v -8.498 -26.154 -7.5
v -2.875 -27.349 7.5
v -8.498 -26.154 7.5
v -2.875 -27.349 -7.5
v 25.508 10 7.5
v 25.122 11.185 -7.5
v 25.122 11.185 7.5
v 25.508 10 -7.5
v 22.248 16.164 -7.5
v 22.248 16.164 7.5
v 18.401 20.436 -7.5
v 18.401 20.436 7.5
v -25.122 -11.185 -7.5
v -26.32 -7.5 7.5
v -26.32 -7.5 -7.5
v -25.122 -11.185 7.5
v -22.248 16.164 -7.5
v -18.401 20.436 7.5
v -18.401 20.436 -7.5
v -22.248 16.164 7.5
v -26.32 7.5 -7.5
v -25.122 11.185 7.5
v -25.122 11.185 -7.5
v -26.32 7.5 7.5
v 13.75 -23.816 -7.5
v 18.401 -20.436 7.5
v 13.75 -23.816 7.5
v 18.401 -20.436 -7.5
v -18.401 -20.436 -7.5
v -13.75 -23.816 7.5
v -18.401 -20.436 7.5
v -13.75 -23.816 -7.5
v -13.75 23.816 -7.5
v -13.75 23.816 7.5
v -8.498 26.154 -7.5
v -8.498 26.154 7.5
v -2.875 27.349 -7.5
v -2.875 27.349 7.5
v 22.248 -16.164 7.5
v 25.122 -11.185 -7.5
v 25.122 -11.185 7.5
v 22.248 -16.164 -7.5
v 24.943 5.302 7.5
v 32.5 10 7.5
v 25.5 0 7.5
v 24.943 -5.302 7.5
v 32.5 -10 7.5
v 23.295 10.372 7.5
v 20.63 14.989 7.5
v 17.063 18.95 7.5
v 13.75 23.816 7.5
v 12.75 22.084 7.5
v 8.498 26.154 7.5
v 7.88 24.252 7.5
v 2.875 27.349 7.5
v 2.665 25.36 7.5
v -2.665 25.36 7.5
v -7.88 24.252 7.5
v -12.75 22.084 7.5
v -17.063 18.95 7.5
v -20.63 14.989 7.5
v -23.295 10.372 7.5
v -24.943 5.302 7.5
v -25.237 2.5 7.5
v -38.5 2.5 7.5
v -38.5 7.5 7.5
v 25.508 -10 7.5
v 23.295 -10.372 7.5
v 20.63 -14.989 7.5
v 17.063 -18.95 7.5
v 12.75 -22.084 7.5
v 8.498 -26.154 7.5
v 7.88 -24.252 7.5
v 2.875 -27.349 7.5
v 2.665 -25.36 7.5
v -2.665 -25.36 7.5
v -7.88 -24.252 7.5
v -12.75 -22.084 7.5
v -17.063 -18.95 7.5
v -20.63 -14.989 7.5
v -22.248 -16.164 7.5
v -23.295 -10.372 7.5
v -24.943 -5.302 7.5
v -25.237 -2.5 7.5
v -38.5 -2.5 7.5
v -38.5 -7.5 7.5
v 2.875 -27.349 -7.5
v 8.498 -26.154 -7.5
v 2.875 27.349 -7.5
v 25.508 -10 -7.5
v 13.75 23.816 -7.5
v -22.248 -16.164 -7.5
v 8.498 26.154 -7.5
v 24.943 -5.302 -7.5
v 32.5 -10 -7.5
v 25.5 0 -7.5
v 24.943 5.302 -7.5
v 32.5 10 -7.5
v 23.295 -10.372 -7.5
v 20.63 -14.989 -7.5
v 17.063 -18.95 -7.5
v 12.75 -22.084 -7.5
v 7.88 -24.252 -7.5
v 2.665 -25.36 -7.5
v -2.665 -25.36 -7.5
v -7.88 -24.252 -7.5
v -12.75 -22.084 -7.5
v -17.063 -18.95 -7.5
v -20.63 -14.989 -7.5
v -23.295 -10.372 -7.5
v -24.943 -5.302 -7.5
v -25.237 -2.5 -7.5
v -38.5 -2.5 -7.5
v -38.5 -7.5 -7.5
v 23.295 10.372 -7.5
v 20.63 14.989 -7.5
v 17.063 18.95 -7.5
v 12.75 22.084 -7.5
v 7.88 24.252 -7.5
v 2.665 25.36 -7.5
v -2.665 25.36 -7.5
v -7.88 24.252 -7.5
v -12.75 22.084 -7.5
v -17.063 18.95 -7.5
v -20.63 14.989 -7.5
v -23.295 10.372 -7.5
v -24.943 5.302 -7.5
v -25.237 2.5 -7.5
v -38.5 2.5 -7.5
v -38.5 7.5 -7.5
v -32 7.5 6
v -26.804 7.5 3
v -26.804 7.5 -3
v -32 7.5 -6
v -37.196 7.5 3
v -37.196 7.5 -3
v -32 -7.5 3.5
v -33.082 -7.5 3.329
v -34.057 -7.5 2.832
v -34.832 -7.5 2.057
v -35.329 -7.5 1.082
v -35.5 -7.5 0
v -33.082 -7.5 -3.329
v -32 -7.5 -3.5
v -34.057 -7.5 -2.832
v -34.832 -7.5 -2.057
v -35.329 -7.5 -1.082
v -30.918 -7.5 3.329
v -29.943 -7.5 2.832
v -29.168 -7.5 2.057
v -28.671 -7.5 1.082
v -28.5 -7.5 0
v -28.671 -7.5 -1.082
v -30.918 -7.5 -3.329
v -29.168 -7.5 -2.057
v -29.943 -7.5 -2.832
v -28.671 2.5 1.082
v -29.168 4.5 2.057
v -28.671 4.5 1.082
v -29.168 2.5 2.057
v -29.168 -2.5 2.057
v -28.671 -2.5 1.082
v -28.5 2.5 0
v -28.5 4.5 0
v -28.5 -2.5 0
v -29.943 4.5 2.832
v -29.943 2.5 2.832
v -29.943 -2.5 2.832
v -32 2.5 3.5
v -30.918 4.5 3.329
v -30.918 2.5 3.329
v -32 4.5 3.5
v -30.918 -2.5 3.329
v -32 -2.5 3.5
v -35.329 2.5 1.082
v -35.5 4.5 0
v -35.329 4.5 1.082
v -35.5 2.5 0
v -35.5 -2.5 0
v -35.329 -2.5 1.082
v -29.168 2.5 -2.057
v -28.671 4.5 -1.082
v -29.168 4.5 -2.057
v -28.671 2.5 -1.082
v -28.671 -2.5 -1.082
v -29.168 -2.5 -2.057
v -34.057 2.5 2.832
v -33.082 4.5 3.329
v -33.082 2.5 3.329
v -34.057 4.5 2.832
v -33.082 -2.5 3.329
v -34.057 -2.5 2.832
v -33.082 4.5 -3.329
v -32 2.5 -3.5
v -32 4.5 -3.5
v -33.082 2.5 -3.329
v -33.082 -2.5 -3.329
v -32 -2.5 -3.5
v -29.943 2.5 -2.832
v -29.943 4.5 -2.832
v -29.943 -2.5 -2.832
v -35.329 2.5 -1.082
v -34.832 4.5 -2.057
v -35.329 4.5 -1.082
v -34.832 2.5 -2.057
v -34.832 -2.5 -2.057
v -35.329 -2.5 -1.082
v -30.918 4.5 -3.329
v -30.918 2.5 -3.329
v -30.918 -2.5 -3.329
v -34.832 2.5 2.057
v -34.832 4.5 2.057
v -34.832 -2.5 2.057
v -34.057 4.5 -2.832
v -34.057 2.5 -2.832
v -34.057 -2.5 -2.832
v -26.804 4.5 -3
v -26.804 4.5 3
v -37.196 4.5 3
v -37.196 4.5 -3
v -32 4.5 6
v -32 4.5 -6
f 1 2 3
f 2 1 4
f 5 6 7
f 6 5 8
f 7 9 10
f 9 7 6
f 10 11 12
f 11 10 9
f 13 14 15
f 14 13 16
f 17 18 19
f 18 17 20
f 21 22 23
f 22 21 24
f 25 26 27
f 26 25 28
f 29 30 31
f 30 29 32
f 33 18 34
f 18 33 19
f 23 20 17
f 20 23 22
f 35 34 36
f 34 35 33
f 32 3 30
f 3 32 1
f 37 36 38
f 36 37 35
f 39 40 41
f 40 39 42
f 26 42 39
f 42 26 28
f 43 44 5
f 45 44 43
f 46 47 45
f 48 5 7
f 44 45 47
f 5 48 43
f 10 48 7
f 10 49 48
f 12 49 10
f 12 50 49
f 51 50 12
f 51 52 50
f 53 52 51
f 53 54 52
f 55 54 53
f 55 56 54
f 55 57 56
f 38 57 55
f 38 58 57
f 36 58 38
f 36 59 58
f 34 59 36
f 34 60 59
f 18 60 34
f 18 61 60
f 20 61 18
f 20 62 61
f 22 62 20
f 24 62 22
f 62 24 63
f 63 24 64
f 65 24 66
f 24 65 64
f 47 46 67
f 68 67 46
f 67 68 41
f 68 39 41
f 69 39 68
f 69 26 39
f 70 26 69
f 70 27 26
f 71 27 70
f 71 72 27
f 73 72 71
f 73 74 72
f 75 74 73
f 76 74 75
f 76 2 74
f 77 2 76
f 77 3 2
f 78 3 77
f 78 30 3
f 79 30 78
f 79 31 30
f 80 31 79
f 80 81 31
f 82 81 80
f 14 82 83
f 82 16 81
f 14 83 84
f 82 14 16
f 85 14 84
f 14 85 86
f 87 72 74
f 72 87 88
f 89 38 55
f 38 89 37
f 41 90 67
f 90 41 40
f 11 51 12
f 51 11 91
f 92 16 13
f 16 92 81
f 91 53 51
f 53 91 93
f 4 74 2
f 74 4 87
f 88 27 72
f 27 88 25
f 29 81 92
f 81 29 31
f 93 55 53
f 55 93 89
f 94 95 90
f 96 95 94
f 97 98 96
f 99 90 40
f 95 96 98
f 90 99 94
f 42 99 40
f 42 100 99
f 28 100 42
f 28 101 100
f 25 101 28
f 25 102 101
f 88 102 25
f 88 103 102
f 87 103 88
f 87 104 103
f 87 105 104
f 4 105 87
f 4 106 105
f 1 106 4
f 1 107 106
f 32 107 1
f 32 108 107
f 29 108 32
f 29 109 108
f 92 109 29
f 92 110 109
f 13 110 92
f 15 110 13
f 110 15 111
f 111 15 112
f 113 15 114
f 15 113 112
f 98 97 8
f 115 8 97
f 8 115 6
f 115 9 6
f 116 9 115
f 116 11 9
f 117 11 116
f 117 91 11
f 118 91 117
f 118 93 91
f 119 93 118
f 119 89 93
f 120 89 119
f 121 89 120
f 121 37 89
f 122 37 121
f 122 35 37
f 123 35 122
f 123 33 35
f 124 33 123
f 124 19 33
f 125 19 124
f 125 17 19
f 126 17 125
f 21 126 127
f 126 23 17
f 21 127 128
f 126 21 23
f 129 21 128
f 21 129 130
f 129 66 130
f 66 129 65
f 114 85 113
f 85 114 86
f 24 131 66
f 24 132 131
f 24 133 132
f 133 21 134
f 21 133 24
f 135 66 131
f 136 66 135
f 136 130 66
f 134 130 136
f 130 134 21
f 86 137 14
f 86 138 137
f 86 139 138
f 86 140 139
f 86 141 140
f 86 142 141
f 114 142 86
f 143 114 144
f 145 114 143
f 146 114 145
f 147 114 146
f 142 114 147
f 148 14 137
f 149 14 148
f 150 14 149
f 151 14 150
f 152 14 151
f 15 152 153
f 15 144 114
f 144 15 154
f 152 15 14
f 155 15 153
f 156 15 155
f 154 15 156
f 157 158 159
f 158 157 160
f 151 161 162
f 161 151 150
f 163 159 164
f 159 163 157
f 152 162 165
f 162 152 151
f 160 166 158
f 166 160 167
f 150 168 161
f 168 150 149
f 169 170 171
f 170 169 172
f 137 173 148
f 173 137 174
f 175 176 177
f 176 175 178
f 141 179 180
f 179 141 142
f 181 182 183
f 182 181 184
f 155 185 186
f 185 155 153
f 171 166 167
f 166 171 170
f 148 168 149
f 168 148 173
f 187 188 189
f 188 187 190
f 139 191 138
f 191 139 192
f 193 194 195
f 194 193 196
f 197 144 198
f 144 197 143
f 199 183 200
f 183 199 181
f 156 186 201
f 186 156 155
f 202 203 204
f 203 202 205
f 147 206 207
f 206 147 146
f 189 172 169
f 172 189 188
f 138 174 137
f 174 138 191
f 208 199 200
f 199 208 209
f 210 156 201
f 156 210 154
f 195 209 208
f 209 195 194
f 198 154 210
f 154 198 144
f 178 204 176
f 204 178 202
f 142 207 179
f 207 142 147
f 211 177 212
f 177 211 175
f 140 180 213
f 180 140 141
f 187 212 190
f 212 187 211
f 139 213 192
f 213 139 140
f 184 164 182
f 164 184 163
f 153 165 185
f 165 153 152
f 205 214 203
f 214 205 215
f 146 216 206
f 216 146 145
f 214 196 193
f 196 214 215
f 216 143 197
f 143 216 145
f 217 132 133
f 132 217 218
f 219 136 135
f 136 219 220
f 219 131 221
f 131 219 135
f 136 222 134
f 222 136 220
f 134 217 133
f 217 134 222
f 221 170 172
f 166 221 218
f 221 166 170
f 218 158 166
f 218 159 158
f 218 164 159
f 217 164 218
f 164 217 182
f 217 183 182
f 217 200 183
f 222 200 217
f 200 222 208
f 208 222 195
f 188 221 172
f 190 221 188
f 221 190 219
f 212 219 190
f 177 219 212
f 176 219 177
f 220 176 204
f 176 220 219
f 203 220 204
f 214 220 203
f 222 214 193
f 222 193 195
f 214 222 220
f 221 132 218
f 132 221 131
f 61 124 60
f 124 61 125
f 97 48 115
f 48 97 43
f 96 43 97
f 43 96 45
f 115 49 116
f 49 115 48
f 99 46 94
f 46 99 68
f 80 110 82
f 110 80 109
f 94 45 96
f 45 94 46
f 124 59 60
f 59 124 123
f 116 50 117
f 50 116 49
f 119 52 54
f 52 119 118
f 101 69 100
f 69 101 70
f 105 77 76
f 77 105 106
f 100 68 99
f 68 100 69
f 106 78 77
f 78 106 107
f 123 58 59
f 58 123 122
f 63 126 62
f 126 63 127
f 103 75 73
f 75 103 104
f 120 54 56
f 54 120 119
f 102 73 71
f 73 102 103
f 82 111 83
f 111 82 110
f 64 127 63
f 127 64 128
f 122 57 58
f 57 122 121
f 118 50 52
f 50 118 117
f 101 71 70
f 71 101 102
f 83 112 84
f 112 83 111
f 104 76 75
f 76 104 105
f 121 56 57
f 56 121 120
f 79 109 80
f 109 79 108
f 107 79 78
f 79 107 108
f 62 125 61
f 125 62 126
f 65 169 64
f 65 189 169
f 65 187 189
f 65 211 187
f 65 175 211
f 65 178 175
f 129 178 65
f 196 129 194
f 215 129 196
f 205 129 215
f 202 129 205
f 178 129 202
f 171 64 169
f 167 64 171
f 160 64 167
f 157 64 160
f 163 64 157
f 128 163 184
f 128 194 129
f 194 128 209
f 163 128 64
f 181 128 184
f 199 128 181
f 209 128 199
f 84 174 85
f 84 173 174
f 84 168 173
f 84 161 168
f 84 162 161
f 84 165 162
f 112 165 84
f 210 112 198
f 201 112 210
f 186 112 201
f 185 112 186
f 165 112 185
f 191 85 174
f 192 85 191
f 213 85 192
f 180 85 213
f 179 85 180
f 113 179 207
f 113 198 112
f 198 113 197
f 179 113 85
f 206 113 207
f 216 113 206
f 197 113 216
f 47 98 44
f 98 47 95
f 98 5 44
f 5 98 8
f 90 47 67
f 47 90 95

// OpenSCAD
//Parametric clamp

/*
Parameters:
	base : Enable / disable clamp base
	base_thickness : Thickness of clamp base if enabled
	base_width : Width of clamp base if enabled
	ring_thickness : Tickness of clamp ring
	ring_inner_dia : Inner diameter of clamp ring
	jaws_thickness : Thickness of clamp jaws
	jaws_width : Width of clamp jaws
	break_width : Width of break in clamp jaws
	screw_diameter : Screw hole diameter
	screw_count : Screw hole count
	nut_recess : Enable / disable nut recess in clamp
	nut_diameter : Nut recess diameter
	nut_thickness : Nut recess depth
	height : Clamp height
*/

//translate([-25, 0, 25]) 
clamp(ring_inner_dia = 51);
//translate([25, 0, 25]) clamp(base = false);
//translate([-25, 0, -25]) clamp(screw_count = 2);
//translate([25, 0, -25]) clamp(height = 25);

module clamp(base = true, base_thickness = 7, base_width = 20, ring_thickness = 2, ring_inner_dia = 15, jaws_thickness = 5, jaws_width = 13, break_width = 5, screw_diameter = 7, screw_count = 1, nut_recess = true, nut_diameter = 12, nut_thickness = 3, height = 15) {

	//Check base thickness
	if(base && base_thickness < ring_thickness)
		echo("Base thickness must be at least ring thickness, ring will protrude through base");

	//Check jaws width
	if(jaws_width < ring_thickness)
		echo("Jaw width must be at least ring thickness, ring will protrude through jaws");

	//Calculate ring inner radius
	ring_inner_rad = ring_inner_dia / 2;

	//Calculate screw spacing
	screw_spacing = (height - (screw_diameter * screw_count)) / (screw_count + 1);

	//Base
	if(base)
		translate([ring_inner_rad + (base_thickness / 2), 0, 0])
			cube([base_thickness, base_width, height], center=true);

	//Clamp
	difference() {
		union() {
			//Outer cylinder
			cylinder(r=ring_inner_rad + ring_thickness, h=height, center=true);

			//Jaws
			translate([0 - ring_inner_rad - (jaws_width / 2), 0, 0])
				cube([jaws_width, (jaws_thickness * 2) + break_width, height], center=true);
		}
	
		//Inner cylinder
		cylinder(r=ring_inner_rad, h=height + 10, center=true);

		//Break
		translate([0 - ((jaws_width + ring_thickness + (ring_inner_dia / 2) + 10) / 2), 0, 0])
			cube([jaws_width + ring_thickness + (ring_inner_dia / 2) + 10, break_width, height + 10], center=true);

		//Screw hole(s)
		for(i = [1 : screw_count])
			translate([0 - (ring_inner_dia / 2) - (jaws_width / 2), 0, (height / 2) - (screw_diameter / 2) - (screw_spacing * i) - (screw_diameter * (i - 1))])
				rotate([90, 0, 0])
					union() {
						cylinder(r=screw_diameter / 2, h=jaws_thickness * 2 + break_width + 10, center=true, $fn=20);
						if(nut_recess) translate([0, 0, nut_thickness-((nut_thickness + 10)/2)-(break_width/2)-jaws_thickness]) 
                         rotate([0,0,90])   cylinder(r=nut_diameter/2, h=nut_thickness + 10, center=true, $fn=6);
					}
	}
}
